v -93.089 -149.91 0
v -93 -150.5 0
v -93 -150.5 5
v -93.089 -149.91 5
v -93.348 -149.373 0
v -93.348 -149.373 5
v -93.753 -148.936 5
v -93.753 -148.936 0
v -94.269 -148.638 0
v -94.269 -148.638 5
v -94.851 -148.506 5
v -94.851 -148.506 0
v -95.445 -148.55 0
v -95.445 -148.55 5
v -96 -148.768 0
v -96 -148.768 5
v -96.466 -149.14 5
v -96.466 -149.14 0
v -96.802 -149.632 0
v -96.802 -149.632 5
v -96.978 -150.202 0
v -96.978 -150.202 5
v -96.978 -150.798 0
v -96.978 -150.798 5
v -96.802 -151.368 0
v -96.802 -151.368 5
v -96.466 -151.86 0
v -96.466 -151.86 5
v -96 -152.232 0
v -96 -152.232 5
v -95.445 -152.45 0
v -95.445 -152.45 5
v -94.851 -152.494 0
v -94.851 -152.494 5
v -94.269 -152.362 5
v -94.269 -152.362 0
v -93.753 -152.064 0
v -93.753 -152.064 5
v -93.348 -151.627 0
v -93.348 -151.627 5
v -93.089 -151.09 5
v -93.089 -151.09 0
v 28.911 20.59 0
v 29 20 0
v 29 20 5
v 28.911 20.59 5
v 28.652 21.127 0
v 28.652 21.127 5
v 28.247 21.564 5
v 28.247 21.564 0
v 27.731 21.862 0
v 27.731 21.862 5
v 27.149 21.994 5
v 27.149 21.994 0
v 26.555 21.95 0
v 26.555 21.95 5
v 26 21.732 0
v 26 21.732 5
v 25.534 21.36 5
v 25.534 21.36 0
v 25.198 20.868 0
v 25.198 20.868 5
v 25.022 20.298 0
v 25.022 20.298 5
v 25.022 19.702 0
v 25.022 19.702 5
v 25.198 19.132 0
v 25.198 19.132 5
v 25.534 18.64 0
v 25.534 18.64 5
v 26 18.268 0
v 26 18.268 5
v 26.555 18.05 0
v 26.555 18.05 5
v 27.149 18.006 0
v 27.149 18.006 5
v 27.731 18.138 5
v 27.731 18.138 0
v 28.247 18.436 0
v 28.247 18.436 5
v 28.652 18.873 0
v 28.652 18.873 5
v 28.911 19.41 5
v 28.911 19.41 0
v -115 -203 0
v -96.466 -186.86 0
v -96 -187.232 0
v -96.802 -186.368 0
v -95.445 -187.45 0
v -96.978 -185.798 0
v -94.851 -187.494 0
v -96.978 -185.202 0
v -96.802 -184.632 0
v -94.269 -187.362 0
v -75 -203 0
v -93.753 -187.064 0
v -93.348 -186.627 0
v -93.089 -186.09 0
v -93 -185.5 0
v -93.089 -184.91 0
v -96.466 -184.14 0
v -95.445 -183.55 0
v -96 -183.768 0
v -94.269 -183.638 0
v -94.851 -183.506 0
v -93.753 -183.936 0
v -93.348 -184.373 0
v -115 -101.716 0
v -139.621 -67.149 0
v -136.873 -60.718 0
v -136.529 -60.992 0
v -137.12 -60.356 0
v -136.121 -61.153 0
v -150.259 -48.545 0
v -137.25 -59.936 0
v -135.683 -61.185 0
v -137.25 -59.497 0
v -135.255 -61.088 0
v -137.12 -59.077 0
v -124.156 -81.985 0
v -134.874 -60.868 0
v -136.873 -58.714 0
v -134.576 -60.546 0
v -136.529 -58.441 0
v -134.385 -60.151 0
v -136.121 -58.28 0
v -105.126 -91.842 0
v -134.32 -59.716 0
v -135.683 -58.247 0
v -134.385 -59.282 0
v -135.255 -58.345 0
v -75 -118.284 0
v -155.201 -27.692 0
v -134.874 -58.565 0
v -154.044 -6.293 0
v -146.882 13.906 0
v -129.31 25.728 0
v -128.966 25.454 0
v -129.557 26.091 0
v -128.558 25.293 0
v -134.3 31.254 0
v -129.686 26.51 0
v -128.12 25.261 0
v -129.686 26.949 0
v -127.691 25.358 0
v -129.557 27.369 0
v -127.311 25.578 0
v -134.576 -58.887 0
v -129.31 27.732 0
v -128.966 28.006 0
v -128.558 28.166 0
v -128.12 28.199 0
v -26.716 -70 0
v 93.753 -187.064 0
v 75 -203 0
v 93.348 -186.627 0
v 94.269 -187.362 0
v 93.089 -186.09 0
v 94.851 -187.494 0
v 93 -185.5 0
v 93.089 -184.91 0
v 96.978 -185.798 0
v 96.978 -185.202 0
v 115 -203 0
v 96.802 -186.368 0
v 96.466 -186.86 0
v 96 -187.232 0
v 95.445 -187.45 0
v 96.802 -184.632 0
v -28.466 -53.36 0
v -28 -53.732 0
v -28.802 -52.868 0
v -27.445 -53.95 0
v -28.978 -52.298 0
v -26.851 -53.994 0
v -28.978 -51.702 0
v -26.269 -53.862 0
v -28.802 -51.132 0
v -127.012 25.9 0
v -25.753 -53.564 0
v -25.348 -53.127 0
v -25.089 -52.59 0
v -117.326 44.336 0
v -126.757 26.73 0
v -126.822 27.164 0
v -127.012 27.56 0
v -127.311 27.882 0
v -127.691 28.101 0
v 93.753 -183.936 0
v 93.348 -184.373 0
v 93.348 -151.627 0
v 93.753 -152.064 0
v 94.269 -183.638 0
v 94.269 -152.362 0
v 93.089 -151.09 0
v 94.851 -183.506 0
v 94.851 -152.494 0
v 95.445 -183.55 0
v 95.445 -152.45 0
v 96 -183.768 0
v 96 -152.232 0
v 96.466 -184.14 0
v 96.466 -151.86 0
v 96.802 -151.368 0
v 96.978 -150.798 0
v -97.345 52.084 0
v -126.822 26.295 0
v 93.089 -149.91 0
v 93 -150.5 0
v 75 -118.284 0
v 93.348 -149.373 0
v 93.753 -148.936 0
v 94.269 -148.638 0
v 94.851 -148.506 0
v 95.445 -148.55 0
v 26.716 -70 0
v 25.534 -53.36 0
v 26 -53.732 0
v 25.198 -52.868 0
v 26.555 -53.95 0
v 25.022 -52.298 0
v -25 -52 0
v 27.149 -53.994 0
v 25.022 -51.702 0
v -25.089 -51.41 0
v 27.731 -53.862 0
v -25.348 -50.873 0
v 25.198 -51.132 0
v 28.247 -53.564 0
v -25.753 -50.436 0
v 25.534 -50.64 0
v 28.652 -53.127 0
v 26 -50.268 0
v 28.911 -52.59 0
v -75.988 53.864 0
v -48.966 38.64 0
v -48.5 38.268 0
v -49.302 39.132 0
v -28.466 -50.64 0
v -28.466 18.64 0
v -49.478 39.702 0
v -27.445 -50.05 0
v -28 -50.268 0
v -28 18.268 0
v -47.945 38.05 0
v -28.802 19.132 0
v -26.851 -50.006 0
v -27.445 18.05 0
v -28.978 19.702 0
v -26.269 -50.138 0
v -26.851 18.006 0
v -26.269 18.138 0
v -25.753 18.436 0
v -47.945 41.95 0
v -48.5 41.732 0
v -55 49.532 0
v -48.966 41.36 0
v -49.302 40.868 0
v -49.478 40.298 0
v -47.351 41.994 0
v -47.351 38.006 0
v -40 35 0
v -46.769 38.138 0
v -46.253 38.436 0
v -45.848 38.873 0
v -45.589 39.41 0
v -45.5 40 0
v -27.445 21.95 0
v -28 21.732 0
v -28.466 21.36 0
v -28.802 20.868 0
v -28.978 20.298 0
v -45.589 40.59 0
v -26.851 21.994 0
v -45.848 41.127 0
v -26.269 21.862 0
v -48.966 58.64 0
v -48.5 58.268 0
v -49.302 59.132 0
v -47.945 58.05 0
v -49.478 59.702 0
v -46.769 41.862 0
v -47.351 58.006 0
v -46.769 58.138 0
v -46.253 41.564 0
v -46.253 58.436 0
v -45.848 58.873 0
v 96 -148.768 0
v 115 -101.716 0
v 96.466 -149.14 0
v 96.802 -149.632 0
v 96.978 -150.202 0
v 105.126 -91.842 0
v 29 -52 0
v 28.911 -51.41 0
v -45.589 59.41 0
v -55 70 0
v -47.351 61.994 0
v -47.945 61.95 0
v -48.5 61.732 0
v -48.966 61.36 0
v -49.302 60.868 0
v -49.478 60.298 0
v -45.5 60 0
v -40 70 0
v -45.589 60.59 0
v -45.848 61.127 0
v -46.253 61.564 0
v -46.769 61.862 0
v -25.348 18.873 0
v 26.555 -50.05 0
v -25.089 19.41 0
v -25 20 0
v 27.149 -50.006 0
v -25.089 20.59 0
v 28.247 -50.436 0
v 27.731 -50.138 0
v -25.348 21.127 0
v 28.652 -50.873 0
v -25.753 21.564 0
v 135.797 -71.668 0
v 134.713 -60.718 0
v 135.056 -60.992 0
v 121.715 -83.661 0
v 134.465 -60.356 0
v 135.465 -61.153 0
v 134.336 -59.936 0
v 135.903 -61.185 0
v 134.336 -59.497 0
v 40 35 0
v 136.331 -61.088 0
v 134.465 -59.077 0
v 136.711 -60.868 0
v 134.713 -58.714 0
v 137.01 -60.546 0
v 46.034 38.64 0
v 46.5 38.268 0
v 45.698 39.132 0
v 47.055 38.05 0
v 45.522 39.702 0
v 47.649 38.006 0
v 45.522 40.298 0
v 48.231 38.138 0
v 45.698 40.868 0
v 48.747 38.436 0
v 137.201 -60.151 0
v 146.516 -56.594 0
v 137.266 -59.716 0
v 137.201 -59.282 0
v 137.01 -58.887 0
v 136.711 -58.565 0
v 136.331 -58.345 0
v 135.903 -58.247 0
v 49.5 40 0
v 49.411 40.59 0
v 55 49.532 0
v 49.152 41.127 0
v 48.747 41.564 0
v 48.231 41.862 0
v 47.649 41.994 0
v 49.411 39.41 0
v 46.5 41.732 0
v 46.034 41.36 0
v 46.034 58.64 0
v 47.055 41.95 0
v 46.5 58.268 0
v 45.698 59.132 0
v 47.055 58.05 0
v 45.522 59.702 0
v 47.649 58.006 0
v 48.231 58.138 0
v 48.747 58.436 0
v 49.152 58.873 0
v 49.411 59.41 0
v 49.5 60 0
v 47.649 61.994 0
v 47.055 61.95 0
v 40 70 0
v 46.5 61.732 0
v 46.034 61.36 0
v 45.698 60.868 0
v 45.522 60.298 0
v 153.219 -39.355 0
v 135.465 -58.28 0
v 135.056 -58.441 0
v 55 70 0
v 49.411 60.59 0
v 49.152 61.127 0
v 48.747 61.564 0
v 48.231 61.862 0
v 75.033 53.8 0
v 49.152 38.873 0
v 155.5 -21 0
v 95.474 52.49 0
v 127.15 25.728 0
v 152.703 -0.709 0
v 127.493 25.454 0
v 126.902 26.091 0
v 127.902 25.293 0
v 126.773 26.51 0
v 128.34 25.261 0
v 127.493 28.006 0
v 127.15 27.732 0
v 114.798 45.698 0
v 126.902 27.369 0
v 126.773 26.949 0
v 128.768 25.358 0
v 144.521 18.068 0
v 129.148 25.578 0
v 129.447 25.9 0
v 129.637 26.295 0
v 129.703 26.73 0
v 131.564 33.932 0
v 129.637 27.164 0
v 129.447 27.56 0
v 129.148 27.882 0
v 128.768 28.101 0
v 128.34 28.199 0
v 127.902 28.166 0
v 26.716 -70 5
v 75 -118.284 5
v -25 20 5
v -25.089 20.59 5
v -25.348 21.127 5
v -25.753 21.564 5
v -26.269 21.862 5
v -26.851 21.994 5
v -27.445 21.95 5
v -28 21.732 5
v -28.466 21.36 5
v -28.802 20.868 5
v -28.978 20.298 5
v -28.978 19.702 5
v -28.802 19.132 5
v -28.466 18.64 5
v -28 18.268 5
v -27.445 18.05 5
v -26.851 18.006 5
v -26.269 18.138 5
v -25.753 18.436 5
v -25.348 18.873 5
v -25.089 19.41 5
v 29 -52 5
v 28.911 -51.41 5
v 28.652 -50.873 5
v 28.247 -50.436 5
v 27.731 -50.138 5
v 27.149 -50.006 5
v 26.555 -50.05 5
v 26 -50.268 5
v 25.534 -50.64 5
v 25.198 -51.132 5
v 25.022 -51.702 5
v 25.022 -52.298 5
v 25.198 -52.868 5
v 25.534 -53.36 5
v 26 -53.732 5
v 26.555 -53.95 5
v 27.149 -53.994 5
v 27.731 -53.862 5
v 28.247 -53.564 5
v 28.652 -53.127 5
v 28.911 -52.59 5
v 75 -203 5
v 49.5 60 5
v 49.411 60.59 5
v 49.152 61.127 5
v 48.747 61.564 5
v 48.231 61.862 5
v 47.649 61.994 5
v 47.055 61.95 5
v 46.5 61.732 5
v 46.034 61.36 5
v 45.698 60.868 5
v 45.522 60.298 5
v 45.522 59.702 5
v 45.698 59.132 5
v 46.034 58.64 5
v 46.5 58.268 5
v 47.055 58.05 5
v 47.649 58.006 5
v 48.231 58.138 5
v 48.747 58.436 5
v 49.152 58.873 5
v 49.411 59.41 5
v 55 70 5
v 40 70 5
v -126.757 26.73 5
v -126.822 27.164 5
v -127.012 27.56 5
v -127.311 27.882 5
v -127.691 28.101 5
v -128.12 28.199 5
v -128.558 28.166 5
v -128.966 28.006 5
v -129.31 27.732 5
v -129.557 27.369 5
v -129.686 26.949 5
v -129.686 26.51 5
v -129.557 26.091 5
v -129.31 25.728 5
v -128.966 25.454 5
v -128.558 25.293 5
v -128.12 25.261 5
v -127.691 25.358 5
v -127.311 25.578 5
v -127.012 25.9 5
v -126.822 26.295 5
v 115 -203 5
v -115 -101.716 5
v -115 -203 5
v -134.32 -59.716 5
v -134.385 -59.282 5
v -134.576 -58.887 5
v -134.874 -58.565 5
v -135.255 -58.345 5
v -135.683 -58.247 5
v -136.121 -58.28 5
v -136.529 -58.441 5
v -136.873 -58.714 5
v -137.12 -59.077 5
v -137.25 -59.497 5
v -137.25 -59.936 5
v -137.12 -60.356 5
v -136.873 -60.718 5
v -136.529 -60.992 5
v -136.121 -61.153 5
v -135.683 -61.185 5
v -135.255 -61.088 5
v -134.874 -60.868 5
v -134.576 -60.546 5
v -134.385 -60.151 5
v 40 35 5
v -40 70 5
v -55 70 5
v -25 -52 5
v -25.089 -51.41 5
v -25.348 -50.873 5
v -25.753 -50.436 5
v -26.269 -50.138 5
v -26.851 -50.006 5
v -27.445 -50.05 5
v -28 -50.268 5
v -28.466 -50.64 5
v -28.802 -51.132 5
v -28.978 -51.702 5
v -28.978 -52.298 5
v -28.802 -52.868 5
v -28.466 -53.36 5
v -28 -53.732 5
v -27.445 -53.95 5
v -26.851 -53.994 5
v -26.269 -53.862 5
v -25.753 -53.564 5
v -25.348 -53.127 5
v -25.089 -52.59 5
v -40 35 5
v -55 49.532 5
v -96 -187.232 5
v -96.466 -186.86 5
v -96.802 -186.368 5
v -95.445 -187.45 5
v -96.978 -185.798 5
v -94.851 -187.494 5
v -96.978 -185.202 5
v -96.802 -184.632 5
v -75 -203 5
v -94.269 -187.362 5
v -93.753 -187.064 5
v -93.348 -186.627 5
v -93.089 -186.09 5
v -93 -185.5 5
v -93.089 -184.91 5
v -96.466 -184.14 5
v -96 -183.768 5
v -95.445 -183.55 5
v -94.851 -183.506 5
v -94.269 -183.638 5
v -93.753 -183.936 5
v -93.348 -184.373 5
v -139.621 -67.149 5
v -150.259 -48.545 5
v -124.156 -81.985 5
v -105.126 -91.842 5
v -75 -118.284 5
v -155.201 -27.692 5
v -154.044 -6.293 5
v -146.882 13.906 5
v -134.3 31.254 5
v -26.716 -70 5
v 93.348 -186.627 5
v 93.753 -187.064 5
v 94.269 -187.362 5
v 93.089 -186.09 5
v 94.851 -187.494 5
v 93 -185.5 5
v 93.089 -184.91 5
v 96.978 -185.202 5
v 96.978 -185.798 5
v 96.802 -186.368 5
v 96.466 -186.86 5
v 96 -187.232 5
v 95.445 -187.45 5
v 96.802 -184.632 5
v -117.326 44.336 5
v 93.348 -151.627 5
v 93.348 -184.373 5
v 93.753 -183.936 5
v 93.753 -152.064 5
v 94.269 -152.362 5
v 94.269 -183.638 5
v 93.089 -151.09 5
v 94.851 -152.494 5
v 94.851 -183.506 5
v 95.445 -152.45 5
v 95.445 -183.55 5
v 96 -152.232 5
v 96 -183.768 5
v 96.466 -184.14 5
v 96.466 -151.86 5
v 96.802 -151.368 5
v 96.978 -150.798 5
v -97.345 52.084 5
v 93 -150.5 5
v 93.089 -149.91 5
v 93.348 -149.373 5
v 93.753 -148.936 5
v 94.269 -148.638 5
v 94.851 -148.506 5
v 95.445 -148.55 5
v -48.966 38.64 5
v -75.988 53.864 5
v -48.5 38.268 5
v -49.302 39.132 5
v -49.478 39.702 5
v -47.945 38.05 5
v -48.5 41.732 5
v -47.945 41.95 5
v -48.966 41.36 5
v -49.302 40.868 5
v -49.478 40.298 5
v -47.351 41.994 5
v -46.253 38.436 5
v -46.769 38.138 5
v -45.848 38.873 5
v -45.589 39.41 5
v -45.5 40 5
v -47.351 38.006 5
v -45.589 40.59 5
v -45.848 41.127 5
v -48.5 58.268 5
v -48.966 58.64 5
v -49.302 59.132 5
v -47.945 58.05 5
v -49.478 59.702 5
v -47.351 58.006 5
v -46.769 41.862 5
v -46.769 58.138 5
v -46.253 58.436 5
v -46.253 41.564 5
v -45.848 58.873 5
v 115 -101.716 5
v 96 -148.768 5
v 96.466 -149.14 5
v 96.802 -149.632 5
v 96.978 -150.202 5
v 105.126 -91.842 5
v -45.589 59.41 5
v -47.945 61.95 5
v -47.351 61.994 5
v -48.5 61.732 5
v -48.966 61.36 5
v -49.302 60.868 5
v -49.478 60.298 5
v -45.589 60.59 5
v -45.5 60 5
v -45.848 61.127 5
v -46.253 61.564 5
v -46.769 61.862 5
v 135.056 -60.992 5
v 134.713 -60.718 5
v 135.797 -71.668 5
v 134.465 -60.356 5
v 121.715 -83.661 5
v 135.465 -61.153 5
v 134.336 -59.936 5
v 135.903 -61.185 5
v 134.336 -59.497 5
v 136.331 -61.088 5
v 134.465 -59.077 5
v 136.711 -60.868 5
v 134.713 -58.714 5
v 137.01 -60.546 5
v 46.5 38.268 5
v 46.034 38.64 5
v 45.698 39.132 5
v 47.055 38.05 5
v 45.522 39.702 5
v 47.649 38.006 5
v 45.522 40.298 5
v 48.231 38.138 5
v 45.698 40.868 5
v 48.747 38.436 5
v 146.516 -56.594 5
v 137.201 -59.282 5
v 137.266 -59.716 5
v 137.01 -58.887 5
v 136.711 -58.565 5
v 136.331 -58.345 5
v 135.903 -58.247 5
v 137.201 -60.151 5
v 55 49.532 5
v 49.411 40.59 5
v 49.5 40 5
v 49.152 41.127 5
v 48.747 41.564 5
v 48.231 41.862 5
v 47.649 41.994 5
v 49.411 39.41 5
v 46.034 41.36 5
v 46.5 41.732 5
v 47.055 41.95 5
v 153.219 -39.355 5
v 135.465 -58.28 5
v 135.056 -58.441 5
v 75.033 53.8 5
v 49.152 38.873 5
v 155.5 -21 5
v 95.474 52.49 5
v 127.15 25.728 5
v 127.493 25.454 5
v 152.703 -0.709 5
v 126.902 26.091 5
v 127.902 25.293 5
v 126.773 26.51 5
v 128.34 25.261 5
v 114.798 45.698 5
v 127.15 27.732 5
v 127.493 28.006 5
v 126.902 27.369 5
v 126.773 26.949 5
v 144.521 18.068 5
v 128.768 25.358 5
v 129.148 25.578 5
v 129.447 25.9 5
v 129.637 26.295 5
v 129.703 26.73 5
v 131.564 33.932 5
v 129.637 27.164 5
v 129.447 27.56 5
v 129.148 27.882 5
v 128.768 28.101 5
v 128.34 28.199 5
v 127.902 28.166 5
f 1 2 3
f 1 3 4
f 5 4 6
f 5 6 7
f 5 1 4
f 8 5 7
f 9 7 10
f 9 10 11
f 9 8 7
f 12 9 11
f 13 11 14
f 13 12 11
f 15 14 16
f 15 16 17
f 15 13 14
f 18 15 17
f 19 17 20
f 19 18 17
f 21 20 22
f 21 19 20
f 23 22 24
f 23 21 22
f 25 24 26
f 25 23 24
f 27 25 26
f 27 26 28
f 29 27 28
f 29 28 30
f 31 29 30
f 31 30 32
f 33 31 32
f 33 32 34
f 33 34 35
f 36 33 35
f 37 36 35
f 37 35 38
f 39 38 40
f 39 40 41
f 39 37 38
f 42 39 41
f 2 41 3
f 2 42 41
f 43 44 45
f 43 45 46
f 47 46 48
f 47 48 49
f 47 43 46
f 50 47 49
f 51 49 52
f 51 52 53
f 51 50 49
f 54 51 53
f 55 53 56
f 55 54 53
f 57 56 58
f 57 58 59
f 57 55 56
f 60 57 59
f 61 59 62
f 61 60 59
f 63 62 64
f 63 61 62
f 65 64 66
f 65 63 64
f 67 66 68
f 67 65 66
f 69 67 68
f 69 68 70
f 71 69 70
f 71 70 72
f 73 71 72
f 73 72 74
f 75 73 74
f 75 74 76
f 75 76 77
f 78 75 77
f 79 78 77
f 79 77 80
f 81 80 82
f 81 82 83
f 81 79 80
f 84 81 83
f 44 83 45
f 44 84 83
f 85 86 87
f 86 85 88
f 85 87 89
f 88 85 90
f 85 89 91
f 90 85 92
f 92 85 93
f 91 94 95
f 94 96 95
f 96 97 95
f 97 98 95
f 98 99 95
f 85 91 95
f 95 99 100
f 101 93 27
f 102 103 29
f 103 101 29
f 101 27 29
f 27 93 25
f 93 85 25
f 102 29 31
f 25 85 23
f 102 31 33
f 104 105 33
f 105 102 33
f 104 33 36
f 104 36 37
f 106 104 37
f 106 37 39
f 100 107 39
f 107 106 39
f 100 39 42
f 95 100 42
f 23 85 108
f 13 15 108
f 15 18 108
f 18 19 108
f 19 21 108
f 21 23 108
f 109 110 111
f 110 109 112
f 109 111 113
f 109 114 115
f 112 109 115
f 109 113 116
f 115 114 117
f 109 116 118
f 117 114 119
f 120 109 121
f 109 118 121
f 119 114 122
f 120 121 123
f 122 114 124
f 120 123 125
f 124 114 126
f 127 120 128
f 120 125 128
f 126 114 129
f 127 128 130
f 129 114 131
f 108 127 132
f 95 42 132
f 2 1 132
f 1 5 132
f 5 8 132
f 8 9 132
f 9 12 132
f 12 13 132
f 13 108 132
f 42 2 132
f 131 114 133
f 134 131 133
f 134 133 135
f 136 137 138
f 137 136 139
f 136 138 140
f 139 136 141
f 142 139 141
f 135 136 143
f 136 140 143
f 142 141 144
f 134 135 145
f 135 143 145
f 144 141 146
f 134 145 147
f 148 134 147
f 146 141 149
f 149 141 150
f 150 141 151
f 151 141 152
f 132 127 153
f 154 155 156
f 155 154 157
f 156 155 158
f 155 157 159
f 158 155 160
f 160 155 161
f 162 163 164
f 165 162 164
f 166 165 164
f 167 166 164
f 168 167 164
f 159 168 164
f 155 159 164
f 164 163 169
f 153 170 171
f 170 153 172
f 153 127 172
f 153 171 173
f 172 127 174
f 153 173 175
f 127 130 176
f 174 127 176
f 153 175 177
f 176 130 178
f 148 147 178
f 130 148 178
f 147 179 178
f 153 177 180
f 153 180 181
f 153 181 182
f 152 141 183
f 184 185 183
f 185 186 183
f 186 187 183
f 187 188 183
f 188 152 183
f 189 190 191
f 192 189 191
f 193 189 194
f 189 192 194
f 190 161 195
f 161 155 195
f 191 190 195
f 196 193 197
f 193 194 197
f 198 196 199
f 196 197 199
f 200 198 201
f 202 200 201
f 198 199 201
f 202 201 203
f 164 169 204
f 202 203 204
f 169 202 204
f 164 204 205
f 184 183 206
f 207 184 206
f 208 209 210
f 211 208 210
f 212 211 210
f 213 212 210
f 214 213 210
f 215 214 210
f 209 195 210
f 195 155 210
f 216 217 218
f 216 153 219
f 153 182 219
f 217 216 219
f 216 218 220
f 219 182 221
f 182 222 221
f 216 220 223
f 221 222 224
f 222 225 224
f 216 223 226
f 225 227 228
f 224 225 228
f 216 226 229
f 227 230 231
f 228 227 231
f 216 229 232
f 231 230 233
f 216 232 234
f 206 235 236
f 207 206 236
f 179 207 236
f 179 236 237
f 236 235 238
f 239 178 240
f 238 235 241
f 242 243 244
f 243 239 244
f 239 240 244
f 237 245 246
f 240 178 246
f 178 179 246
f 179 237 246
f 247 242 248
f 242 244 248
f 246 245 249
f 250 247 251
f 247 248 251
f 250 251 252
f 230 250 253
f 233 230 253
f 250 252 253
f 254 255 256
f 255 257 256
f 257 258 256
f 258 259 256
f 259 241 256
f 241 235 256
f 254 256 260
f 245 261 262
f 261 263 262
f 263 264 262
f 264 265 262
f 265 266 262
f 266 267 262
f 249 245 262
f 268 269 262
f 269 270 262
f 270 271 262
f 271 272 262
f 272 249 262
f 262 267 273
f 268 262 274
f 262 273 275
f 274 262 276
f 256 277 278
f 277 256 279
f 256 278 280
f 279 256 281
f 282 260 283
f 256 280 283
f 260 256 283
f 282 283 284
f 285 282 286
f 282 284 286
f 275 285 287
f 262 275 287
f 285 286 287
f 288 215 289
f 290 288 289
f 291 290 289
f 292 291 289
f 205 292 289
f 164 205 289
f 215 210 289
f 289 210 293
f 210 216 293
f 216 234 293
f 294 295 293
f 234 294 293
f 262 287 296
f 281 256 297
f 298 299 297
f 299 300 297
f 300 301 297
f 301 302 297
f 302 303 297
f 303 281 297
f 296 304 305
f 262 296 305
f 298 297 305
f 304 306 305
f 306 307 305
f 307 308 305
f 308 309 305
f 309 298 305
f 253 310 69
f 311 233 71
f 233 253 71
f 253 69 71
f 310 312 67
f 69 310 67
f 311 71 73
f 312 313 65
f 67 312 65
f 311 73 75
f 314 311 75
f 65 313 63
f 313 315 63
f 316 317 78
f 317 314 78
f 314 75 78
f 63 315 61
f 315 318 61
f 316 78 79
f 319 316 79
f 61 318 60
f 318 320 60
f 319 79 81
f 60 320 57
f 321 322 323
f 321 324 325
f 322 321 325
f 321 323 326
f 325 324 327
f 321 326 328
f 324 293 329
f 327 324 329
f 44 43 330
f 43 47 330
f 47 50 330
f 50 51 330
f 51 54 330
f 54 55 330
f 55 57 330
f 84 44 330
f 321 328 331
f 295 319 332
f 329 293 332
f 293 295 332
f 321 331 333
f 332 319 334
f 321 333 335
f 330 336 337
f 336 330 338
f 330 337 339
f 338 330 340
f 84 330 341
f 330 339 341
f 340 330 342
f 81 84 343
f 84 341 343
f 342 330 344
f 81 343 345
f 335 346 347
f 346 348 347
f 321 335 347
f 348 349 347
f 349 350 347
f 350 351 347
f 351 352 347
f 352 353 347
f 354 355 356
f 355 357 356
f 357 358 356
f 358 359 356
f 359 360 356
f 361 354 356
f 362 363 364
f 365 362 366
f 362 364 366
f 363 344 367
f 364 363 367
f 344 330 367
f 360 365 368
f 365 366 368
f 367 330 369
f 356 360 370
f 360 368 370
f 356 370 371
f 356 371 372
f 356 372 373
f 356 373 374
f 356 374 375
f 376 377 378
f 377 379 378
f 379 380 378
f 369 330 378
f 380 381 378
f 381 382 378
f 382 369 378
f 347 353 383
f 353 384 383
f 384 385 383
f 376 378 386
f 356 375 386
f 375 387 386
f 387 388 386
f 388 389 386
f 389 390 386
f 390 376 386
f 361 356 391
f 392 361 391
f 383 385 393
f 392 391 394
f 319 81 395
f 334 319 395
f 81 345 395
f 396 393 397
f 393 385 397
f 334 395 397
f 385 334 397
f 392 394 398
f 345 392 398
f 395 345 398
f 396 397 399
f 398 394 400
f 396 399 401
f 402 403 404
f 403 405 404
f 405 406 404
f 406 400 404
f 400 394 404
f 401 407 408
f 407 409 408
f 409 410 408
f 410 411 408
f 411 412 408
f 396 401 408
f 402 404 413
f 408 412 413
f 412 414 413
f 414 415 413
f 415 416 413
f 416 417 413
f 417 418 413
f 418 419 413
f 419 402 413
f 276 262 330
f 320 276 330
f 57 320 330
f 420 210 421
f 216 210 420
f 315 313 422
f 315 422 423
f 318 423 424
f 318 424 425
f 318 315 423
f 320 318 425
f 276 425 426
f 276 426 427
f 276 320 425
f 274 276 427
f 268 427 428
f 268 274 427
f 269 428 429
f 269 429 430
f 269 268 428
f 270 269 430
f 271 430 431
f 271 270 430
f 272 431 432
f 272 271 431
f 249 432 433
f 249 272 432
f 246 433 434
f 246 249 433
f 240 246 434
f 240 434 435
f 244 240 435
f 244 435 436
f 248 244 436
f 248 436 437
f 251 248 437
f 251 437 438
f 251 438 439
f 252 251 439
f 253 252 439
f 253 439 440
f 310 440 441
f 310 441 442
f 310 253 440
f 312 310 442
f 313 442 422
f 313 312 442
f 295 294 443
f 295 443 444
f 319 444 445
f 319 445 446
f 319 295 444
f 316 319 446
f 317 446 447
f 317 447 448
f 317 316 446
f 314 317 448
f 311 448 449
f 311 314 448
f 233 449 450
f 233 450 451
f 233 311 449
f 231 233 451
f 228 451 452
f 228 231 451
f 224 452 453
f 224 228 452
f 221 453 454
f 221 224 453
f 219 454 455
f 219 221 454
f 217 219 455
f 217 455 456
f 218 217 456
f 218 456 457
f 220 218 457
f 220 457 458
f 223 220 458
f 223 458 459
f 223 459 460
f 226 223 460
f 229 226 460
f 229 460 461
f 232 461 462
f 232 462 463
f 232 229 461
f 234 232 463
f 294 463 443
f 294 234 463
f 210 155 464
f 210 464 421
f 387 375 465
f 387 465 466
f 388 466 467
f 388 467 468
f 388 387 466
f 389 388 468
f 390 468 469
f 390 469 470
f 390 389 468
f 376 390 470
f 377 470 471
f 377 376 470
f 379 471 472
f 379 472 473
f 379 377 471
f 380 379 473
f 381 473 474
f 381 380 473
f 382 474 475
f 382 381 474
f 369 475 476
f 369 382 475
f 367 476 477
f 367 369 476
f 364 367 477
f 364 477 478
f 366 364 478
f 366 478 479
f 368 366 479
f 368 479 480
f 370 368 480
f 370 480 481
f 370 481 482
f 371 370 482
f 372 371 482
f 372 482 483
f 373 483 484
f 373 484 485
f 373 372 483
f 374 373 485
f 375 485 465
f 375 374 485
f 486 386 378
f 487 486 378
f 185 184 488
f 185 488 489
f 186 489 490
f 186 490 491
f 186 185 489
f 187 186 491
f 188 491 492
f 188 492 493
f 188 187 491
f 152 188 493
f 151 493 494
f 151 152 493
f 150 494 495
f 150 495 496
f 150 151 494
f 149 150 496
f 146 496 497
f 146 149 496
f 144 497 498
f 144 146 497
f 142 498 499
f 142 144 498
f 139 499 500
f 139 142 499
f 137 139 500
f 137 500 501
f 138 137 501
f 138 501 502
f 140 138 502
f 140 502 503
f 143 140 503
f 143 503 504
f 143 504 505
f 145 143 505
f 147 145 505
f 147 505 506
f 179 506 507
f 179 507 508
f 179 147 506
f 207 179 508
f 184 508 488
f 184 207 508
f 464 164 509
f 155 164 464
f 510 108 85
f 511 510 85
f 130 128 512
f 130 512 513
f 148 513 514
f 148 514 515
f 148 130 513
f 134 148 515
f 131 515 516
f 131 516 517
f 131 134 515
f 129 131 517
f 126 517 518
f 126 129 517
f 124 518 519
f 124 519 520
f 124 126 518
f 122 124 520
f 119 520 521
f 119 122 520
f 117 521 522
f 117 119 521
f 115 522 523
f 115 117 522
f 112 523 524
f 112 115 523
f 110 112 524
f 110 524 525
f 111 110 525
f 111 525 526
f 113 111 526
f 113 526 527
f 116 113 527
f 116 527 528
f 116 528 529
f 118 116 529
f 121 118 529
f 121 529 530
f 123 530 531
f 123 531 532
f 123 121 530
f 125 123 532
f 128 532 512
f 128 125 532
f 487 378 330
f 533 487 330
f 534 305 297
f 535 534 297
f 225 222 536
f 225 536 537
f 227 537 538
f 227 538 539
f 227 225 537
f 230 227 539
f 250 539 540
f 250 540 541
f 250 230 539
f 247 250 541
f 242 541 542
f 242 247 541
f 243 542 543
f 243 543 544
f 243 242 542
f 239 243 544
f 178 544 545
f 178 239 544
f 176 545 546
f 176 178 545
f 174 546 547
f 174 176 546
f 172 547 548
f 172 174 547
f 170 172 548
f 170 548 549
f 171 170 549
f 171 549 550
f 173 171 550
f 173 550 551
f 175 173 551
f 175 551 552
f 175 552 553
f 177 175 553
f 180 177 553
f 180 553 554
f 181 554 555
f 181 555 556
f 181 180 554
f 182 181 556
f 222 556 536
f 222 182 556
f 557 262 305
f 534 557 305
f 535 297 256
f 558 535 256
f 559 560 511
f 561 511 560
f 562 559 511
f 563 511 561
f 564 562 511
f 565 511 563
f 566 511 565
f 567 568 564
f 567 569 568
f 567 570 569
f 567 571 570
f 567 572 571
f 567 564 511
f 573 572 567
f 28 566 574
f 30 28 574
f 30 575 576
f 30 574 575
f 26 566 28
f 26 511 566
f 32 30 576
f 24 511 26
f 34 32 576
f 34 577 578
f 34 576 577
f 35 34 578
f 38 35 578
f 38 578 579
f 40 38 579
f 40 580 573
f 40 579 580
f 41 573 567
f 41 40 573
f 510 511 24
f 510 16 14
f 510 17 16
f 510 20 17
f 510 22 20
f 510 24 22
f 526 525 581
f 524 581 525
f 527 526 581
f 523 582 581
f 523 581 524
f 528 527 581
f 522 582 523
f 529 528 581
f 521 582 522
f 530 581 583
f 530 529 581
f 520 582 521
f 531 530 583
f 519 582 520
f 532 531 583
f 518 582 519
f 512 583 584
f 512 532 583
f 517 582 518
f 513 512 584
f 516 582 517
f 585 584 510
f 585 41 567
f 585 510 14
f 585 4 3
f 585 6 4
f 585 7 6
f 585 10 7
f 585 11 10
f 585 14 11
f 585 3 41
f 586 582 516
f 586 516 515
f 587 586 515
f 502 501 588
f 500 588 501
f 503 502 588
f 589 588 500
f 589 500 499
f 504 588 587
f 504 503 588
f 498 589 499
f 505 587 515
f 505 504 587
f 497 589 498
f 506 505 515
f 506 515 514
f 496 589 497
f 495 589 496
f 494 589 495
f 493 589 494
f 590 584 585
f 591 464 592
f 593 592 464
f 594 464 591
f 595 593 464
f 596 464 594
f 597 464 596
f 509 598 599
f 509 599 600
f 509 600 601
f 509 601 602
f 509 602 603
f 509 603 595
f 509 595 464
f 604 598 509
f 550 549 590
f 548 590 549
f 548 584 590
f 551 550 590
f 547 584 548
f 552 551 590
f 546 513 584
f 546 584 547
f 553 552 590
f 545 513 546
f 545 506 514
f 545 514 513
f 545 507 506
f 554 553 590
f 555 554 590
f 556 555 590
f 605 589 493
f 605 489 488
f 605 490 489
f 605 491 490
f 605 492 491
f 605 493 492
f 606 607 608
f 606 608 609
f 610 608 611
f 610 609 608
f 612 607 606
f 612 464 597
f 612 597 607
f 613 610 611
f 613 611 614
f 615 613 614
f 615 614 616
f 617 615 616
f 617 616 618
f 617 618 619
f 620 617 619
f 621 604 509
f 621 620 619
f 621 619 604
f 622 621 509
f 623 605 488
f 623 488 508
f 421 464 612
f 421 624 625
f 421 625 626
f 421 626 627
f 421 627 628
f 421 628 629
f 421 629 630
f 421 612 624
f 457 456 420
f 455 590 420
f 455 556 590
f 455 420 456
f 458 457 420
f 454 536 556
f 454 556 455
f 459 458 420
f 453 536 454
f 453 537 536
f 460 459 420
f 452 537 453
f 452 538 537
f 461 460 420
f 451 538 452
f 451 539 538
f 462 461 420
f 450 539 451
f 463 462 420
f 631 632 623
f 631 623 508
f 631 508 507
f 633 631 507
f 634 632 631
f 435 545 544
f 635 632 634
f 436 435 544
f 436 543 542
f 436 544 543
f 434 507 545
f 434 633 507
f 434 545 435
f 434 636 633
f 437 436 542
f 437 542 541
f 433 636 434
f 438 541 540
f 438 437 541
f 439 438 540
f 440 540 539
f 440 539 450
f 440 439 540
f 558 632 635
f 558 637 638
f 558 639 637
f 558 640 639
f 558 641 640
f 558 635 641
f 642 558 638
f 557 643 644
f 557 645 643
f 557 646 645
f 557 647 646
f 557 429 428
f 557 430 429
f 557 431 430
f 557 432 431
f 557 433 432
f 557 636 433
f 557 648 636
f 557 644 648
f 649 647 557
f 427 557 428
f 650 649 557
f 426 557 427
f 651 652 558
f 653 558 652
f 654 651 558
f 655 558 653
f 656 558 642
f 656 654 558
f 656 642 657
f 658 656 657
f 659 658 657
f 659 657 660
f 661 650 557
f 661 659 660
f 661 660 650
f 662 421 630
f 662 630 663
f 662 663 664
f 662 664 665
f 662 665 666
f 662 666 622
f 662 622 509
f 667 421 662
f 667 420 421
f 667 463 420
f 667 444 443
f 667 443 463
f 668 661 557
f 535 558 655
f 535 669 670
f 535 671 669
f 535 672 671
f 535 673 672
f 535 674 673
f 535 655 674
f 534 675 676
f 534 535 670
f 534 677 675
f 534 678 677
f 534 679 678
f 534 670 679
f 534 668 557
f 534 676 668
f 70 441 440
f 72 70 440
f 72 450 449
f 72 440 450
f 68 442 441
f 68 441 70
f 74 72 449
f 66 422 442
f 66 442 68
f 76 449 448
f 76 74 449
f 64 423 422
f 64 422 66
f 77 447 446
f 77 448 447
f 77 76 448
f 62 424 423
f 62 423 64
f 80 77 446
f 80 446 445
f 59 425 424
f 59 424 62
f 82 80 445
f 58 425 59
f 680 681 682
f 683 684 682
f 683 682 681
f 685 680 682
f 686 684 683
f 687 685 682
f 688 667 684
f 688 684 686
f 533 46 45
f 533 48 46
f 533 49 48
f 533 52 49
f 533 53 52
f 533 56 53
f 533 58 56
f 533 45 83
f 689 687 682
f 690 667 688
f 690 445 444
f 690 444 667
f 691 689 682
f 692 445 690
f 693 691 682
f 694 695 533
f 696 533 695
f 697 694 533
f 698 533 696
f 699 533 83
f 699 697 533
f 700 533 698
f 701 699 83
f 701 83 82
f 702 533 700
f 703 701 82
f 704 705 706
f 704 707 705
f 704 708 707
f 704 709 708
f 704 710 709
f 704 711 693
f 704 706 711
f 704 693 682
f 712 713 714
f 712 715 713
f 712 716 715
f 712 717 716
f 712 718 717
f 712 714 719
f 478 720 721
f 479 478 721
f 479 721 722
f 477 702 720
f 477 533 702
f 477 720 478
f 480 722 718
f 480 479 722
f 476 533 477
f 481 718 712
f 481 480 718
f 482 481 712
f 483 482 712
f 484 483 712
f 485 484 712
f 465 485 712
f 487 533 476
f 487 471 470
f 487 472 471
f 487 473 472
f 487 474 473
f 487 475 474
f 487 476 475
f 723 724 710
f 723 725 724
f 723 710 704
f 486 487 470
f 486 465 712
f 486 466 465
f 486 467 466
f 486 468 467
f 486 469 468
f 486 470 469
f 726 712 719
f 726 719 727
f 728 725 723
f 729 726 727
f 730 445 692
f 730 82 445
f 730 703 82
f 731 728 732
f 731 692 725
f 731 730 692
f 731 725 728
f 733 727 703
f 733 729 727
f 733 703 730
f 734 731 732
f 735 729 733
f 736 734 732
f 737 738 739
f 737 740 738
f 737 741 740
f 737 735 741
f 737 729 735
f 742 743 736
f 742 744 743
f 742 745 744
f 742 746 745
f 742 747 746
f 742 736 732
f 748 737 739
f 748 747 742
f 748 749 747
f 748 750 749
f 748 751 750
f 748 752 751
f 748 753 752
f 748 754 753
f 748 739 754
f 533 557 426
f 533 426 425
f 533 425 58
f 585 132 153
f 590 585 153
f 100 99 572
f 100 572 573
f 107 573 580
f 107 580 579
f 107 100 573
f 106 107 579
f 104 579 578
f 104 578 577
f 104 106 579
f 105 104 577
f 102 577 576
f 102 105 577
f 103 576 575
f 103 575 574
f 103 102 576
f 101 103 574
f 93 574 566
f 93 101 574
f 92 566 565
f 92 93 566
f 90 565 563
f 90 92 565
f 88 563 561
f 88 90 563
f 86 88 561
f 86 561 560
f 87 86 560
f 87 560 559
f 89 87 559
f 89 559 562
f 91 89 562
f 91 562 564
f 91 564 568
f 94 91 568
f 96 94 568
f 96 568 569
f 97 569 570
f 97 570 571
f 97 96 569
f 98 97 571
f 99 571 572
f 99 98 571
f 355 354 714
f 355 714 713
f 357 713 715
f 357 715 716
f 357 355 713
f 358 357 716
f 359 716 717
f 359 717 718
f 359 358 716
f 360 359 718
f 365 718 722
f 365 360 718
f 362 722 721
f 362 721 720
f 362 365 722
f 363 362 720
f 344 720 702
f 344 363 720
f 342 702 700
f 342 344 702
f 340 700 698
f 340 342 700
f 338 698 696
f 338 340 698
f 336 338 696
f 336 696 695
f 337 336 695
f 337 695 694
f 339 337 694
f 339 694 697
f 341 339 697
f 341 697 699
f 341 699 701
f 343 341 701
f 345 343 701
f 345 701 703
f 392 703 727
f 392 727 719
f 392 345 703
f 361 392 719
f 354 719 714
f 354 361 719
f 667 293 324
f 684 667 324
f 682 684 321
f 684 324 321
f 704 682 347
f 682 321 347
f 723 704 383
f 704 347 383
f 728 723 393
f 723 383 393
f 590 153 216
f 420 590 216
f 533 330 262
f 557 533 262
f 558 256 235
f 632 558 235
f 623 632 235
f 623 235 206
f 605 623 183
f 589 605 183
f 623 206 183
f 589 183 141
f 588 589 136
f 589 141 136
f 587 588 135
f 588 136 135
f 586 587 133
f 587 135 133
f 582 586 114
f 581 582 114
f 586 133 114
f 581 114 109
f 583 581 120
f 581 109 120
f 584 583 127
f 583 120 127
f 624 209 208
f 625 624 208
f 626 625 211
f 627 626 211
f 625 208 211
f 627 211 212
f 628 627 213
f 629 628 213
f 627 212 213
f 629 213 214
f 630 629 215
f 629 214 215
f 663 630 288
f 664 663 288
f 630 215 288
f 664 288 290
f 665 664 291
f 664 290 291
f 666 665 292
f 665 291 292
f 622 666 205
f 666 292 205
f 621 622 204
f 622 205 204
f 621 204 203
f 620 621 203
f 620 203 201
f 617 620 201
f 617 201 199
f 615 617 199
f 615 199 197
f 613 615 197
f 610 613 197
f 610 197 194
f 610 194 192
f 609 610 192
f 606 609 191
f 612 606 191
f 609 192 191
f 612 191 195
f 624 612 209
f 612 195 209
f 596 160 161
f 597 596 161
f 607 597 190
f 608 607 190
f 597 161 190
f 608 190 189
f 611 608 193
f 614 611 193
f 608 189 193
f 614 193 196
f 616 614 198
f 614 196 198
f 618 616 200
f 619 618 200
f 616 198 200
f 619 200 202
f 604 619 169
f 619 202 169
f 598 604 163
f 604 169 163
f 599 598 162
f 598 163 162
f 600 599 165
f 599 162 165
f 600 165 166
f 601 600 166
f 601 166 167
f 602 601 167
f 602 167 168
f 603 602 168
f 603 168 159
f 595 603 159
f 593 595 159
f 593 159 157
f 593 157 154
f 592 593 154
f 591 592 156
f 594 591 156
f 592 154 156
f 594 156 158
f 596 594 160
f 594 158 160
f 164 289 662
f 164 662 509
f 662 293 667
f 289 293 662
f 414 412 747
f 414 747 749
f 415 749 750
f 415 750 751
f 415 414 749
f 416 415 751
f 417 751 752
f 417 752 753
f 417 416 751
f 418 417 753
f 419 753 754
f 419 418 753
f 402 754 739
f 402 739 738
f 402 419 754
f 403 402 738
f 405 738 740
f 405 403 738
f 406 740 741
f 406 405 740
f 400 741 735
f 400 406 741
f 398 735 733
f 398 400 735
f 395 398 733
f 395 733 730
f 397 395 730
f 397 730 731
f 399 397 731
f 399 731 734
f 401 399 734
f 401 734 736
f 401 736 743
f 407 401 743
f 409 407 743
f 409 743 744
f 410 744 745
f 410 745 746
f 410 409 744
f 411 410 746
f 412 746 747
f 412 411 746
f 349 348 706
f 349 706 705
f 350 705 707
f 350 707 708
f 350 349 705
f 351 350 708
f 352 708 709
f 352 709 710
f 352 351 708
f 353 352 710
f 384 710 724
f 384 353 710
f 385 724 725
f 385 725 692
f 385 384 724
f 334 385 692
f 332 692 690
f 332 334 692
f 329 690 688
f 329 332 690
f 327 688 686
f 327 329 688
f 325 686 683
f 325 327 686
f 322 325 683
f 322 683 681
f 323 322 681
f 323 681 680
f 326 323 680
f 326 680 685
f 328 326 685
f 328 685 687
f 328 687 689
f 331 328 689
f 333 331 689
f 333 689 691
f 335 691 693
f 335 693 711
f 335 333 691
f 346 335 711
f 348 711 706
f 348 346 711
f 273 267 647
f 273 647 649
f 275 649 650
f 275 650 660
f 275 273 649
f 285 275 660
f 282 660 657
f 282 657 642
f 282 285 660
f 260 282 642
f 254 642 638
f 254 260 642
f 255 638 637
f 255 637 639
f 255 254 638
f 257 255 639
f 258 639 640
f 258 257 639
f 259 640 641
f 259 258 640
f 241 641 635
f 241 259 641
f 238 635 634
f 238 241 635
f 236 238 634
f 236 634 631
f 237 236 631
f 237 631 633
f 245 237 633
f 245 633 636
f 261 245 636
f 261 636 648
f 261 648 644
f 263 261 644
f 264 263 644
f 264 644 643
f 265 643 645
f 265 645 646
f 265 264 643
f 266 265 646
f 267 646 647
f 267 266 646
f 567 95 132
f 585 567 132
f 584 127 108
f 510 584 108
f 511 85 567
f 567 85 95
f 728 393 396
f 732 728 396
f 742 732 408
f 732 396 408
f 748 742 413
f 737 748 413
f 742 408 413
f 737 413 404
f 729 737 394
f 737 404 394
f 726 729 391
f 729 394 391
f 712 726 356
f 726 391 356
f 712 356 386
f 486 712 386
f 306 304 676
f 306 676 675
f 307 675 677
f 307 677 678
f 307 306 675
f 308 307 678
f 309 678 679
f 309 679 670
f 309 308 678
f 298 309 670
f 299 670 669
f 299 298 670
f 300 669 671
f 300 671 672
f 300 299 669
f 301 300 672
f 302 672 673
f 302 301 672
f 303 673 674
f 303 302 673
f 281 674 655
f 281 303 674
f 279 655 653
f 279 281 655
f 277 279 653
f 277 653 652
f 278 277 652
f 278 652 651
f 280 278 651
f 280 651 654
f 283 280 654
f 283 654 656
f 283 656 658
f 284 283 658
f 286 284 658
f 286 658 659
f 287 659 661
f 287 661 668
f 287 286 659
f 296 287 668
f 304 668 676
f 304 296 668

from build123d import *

# Parameters (mm, degrees)
SKETCH1_R           = 2
BOSS_EXTRUDE1_DEPTH = 5
SKETCH2_R           = 2
BOSS_EXTRUDE2_DEPTH = 5
BOSS_EXTRUDE3_START = -5
SKETCH3_R           = 1.4732
SKETCH3_R_2         = 2
BOSS_EXTRUDE3_DEPTH = 5


with BuildPart() as part:
    # Sketch1 → Boss-Extrude1 (new body)
    with BuildSketch(Plane.XY):
        Polygon((-40, 70), (-55, 70), (-55, -70), (55, -70), (55, 70), (40, 70), (40, 35), (-40, 35), align=None)
        with Locations((-27, -52)):
            Circle(SKETCH1_R, mode=Mode.SUBTRACT)
        with Locations((27, -52)):
            Circle(SKETCH1_R, mode=Mode.SUBTRACT)
        with Locations((-27, 20)):
            Circle(SKETCH1_R, mode=Mode.SUBTRACT)
        with Locations((-47.5, 40)):
            Circle(SKETCH1_R, mode=Mode.SUBTRACT)
        with Locations((-47.5, 60)):
            Circle(SKETCH1_R, mode=Mode.SUBTRACT)
        with Locations((27, 20)):
            Circle(SKETCH1_R, mode=Mode.SUBTRACT)
        with Locations((47.5, 40)):
            Circle(SKETCH1_R, mode=Mode.SUBTRACT)
        with Locations((47.5, 60)):
            Circle(SKETCH1_R, mode=Mode.SUBTRACT)
    extrude(amount=BOSS_EXTRUDE1_DEPTH)

    # Sketch2 → Boss-Extrude2 (add)
    with BuildSketch(Plane.XY):
        Polygon((-26.715726767, -70), (-55, -41.715726767), (-115, -101.715728753), (-115, -203), (-75, -203), (-75, -118.284271635), align=None)
        with Locations((-95, -185.5)):
            Circle(SKETCH2_R, mode=Mode.SUBTRACT)
        with Locations((-95, -150.5)):
            Circle(SKETCH2_R, mode=Mode.SUBTRACT)
    boss_extrude2 = extrude(amount=BOSS_EXTRUDE2_DEPTH)

    # Mirror1: Boss-Extrude2 across plane
    add(boss_extrude2.mirror(Plane(origin=(0, 0, 0), x_dir=(0, 0, 1), z_dir=(1, 0, 0))))

    # Sketch3 → Boss-Extrude3 (add)
    # profile 1 of 4: a face of its own
    with BuildSketch(Plane.XY.offset(5).offset(BOSS_EXTRUDE3_START)):
        with BuildLine():
            ThreePointArc((-55, 49.531907673), (-151.188193929, 4.063504127), (-105.126050476, -91.841778902))
            Line((-105.126050476, -91.841778902), (-55, -41.715726767))
            Line((-55, -41.715726767), (-55, 49.531907673))
        make_face()
        with Locations((-135.79276299, -59.716409454)):
            Circle(SKETCH3_R, mode=Mode.SUBTRACT)
        with Locations((-128.22970773, 26.72970773)):
            Circle(SKETCH3_R, mode=Mode.SUBTRACT)
    # profile 2 of 4: a face of its own
    with BuildSketch(Plane.XY.offset(5).offset(BOSS_EXTRUDE3_START)):
        with BuildLine():
            ThreePointArc((-105.126050476, -91.841778902), (-72.958779258, -95.619903442), (-42.197872056, -85.482144776))
            Line((-42.197872056, -85.482144776), (-26.715726767, -70))
            Line((-26.715726767, -70), (-23.719721734, -70))
            ThreePointArc((-23.719721734, -70), (-10.202344029, -47.138851639), (-5.5, -21))
            ThreePointArc((-5.5, -21), (-12.064844908, 9.685982916), (-30.610121267, 35))
            Line((-30.610121267, 35), (-40, 35))
            Line((-40, 35), (-40, 42.124876238))
            ThreePointArc((-40, 42.124876238), (-47.292831667, 46.247929123), (-55, 49.531907673))
            Line((-55, 49.531907673), (-55, -41.715726767))
            Line((-55, -41.715726767), (-105.126050476, -91.841778902))
        make_face()
        with Locations((-27, -52)):
            Circle(SKETCH3_R_2, mode=Mode.SUBTRACT)
        with Locations((-27, 20)):
            Circle(SKETCH3_R_2, mode=Mode.SUBTRACT)
        with Locations((-47.5, 40)):
            Circle(SKETCH3_R_2, mode=Mode.SUBTRACT)
    # profile 3 of 4: a face of its own
    with BuildSketch(Plane.XY.offset(5).offset(BOSS_EXTRUDE3_START)):
        with BuildLine():
            ThreePointArc((30.610121267, 35), (5.660968749, -16.088849276), (23.719721734, -70))
            Line((23.719721734, -70), (26.715726767, -70))
            Line((26.715726767, -70), (42.197872056, -85.482144776))
            ThreePointArc((42.197872056, -85.482144776), (72.958779258, -95.619903442), (105.126050476, -91.841778902))
            Line((105.126050476, -91.841778902), (55, -41.715726767))
            Line((55, -41.715726767), (55, 49.531907673))
            ThreePointArc((55, 49.531907673), (47.292831667, 46.247929123), (40, 42.124876238))
            Line((40, 42.124876238), (40, 35))
            Line((40, 35), (30.610121267, 35))
        make_face()
        with Locations((27, -52)):
            Circle(SKETCH3_R_2, mode=Mode.SUBTRACT)
        with Locations((27, 20)):
            Circle(SKETCH3_R_2, mode=Mode.SUBTRACT)
        with Locations((47.5, 40)):
            Circle(SKETCH3_R_2, mode=Mode.SUBTRACT)
    # profile 4 of 4: a face of its own
    with BuildSketch(Plane.XY.offset(5).offset(BOSS_EXTRUDE3_START)):
        with BuildLine():
            Line((55, -41.715726767), (105.126050476, -91.841778902))
            ThreePointArc((105.126050476, -91.841778902), (141.622638137, -64.462893451), (155.5, -21))
            ThreePointArc((155.5, -21), (123.584219849, 40.390145789), (55, 49.531907673))
            Line((55, 49.531907673), (55, -41.715726767))
        make_face()
        with Locations((135.79276299, -59.716409454)):
            Circle(SKETCH3_R, mode=Mode.SUBTRACT)
        with Locations((128.22970773, 26.72970773)):
            Circle(SKETCH3_R, mode=Mode.SUBTRACT)
    extrude(amount=BOSS_EXTRUDE3_DEPTH)


solid = part.part
